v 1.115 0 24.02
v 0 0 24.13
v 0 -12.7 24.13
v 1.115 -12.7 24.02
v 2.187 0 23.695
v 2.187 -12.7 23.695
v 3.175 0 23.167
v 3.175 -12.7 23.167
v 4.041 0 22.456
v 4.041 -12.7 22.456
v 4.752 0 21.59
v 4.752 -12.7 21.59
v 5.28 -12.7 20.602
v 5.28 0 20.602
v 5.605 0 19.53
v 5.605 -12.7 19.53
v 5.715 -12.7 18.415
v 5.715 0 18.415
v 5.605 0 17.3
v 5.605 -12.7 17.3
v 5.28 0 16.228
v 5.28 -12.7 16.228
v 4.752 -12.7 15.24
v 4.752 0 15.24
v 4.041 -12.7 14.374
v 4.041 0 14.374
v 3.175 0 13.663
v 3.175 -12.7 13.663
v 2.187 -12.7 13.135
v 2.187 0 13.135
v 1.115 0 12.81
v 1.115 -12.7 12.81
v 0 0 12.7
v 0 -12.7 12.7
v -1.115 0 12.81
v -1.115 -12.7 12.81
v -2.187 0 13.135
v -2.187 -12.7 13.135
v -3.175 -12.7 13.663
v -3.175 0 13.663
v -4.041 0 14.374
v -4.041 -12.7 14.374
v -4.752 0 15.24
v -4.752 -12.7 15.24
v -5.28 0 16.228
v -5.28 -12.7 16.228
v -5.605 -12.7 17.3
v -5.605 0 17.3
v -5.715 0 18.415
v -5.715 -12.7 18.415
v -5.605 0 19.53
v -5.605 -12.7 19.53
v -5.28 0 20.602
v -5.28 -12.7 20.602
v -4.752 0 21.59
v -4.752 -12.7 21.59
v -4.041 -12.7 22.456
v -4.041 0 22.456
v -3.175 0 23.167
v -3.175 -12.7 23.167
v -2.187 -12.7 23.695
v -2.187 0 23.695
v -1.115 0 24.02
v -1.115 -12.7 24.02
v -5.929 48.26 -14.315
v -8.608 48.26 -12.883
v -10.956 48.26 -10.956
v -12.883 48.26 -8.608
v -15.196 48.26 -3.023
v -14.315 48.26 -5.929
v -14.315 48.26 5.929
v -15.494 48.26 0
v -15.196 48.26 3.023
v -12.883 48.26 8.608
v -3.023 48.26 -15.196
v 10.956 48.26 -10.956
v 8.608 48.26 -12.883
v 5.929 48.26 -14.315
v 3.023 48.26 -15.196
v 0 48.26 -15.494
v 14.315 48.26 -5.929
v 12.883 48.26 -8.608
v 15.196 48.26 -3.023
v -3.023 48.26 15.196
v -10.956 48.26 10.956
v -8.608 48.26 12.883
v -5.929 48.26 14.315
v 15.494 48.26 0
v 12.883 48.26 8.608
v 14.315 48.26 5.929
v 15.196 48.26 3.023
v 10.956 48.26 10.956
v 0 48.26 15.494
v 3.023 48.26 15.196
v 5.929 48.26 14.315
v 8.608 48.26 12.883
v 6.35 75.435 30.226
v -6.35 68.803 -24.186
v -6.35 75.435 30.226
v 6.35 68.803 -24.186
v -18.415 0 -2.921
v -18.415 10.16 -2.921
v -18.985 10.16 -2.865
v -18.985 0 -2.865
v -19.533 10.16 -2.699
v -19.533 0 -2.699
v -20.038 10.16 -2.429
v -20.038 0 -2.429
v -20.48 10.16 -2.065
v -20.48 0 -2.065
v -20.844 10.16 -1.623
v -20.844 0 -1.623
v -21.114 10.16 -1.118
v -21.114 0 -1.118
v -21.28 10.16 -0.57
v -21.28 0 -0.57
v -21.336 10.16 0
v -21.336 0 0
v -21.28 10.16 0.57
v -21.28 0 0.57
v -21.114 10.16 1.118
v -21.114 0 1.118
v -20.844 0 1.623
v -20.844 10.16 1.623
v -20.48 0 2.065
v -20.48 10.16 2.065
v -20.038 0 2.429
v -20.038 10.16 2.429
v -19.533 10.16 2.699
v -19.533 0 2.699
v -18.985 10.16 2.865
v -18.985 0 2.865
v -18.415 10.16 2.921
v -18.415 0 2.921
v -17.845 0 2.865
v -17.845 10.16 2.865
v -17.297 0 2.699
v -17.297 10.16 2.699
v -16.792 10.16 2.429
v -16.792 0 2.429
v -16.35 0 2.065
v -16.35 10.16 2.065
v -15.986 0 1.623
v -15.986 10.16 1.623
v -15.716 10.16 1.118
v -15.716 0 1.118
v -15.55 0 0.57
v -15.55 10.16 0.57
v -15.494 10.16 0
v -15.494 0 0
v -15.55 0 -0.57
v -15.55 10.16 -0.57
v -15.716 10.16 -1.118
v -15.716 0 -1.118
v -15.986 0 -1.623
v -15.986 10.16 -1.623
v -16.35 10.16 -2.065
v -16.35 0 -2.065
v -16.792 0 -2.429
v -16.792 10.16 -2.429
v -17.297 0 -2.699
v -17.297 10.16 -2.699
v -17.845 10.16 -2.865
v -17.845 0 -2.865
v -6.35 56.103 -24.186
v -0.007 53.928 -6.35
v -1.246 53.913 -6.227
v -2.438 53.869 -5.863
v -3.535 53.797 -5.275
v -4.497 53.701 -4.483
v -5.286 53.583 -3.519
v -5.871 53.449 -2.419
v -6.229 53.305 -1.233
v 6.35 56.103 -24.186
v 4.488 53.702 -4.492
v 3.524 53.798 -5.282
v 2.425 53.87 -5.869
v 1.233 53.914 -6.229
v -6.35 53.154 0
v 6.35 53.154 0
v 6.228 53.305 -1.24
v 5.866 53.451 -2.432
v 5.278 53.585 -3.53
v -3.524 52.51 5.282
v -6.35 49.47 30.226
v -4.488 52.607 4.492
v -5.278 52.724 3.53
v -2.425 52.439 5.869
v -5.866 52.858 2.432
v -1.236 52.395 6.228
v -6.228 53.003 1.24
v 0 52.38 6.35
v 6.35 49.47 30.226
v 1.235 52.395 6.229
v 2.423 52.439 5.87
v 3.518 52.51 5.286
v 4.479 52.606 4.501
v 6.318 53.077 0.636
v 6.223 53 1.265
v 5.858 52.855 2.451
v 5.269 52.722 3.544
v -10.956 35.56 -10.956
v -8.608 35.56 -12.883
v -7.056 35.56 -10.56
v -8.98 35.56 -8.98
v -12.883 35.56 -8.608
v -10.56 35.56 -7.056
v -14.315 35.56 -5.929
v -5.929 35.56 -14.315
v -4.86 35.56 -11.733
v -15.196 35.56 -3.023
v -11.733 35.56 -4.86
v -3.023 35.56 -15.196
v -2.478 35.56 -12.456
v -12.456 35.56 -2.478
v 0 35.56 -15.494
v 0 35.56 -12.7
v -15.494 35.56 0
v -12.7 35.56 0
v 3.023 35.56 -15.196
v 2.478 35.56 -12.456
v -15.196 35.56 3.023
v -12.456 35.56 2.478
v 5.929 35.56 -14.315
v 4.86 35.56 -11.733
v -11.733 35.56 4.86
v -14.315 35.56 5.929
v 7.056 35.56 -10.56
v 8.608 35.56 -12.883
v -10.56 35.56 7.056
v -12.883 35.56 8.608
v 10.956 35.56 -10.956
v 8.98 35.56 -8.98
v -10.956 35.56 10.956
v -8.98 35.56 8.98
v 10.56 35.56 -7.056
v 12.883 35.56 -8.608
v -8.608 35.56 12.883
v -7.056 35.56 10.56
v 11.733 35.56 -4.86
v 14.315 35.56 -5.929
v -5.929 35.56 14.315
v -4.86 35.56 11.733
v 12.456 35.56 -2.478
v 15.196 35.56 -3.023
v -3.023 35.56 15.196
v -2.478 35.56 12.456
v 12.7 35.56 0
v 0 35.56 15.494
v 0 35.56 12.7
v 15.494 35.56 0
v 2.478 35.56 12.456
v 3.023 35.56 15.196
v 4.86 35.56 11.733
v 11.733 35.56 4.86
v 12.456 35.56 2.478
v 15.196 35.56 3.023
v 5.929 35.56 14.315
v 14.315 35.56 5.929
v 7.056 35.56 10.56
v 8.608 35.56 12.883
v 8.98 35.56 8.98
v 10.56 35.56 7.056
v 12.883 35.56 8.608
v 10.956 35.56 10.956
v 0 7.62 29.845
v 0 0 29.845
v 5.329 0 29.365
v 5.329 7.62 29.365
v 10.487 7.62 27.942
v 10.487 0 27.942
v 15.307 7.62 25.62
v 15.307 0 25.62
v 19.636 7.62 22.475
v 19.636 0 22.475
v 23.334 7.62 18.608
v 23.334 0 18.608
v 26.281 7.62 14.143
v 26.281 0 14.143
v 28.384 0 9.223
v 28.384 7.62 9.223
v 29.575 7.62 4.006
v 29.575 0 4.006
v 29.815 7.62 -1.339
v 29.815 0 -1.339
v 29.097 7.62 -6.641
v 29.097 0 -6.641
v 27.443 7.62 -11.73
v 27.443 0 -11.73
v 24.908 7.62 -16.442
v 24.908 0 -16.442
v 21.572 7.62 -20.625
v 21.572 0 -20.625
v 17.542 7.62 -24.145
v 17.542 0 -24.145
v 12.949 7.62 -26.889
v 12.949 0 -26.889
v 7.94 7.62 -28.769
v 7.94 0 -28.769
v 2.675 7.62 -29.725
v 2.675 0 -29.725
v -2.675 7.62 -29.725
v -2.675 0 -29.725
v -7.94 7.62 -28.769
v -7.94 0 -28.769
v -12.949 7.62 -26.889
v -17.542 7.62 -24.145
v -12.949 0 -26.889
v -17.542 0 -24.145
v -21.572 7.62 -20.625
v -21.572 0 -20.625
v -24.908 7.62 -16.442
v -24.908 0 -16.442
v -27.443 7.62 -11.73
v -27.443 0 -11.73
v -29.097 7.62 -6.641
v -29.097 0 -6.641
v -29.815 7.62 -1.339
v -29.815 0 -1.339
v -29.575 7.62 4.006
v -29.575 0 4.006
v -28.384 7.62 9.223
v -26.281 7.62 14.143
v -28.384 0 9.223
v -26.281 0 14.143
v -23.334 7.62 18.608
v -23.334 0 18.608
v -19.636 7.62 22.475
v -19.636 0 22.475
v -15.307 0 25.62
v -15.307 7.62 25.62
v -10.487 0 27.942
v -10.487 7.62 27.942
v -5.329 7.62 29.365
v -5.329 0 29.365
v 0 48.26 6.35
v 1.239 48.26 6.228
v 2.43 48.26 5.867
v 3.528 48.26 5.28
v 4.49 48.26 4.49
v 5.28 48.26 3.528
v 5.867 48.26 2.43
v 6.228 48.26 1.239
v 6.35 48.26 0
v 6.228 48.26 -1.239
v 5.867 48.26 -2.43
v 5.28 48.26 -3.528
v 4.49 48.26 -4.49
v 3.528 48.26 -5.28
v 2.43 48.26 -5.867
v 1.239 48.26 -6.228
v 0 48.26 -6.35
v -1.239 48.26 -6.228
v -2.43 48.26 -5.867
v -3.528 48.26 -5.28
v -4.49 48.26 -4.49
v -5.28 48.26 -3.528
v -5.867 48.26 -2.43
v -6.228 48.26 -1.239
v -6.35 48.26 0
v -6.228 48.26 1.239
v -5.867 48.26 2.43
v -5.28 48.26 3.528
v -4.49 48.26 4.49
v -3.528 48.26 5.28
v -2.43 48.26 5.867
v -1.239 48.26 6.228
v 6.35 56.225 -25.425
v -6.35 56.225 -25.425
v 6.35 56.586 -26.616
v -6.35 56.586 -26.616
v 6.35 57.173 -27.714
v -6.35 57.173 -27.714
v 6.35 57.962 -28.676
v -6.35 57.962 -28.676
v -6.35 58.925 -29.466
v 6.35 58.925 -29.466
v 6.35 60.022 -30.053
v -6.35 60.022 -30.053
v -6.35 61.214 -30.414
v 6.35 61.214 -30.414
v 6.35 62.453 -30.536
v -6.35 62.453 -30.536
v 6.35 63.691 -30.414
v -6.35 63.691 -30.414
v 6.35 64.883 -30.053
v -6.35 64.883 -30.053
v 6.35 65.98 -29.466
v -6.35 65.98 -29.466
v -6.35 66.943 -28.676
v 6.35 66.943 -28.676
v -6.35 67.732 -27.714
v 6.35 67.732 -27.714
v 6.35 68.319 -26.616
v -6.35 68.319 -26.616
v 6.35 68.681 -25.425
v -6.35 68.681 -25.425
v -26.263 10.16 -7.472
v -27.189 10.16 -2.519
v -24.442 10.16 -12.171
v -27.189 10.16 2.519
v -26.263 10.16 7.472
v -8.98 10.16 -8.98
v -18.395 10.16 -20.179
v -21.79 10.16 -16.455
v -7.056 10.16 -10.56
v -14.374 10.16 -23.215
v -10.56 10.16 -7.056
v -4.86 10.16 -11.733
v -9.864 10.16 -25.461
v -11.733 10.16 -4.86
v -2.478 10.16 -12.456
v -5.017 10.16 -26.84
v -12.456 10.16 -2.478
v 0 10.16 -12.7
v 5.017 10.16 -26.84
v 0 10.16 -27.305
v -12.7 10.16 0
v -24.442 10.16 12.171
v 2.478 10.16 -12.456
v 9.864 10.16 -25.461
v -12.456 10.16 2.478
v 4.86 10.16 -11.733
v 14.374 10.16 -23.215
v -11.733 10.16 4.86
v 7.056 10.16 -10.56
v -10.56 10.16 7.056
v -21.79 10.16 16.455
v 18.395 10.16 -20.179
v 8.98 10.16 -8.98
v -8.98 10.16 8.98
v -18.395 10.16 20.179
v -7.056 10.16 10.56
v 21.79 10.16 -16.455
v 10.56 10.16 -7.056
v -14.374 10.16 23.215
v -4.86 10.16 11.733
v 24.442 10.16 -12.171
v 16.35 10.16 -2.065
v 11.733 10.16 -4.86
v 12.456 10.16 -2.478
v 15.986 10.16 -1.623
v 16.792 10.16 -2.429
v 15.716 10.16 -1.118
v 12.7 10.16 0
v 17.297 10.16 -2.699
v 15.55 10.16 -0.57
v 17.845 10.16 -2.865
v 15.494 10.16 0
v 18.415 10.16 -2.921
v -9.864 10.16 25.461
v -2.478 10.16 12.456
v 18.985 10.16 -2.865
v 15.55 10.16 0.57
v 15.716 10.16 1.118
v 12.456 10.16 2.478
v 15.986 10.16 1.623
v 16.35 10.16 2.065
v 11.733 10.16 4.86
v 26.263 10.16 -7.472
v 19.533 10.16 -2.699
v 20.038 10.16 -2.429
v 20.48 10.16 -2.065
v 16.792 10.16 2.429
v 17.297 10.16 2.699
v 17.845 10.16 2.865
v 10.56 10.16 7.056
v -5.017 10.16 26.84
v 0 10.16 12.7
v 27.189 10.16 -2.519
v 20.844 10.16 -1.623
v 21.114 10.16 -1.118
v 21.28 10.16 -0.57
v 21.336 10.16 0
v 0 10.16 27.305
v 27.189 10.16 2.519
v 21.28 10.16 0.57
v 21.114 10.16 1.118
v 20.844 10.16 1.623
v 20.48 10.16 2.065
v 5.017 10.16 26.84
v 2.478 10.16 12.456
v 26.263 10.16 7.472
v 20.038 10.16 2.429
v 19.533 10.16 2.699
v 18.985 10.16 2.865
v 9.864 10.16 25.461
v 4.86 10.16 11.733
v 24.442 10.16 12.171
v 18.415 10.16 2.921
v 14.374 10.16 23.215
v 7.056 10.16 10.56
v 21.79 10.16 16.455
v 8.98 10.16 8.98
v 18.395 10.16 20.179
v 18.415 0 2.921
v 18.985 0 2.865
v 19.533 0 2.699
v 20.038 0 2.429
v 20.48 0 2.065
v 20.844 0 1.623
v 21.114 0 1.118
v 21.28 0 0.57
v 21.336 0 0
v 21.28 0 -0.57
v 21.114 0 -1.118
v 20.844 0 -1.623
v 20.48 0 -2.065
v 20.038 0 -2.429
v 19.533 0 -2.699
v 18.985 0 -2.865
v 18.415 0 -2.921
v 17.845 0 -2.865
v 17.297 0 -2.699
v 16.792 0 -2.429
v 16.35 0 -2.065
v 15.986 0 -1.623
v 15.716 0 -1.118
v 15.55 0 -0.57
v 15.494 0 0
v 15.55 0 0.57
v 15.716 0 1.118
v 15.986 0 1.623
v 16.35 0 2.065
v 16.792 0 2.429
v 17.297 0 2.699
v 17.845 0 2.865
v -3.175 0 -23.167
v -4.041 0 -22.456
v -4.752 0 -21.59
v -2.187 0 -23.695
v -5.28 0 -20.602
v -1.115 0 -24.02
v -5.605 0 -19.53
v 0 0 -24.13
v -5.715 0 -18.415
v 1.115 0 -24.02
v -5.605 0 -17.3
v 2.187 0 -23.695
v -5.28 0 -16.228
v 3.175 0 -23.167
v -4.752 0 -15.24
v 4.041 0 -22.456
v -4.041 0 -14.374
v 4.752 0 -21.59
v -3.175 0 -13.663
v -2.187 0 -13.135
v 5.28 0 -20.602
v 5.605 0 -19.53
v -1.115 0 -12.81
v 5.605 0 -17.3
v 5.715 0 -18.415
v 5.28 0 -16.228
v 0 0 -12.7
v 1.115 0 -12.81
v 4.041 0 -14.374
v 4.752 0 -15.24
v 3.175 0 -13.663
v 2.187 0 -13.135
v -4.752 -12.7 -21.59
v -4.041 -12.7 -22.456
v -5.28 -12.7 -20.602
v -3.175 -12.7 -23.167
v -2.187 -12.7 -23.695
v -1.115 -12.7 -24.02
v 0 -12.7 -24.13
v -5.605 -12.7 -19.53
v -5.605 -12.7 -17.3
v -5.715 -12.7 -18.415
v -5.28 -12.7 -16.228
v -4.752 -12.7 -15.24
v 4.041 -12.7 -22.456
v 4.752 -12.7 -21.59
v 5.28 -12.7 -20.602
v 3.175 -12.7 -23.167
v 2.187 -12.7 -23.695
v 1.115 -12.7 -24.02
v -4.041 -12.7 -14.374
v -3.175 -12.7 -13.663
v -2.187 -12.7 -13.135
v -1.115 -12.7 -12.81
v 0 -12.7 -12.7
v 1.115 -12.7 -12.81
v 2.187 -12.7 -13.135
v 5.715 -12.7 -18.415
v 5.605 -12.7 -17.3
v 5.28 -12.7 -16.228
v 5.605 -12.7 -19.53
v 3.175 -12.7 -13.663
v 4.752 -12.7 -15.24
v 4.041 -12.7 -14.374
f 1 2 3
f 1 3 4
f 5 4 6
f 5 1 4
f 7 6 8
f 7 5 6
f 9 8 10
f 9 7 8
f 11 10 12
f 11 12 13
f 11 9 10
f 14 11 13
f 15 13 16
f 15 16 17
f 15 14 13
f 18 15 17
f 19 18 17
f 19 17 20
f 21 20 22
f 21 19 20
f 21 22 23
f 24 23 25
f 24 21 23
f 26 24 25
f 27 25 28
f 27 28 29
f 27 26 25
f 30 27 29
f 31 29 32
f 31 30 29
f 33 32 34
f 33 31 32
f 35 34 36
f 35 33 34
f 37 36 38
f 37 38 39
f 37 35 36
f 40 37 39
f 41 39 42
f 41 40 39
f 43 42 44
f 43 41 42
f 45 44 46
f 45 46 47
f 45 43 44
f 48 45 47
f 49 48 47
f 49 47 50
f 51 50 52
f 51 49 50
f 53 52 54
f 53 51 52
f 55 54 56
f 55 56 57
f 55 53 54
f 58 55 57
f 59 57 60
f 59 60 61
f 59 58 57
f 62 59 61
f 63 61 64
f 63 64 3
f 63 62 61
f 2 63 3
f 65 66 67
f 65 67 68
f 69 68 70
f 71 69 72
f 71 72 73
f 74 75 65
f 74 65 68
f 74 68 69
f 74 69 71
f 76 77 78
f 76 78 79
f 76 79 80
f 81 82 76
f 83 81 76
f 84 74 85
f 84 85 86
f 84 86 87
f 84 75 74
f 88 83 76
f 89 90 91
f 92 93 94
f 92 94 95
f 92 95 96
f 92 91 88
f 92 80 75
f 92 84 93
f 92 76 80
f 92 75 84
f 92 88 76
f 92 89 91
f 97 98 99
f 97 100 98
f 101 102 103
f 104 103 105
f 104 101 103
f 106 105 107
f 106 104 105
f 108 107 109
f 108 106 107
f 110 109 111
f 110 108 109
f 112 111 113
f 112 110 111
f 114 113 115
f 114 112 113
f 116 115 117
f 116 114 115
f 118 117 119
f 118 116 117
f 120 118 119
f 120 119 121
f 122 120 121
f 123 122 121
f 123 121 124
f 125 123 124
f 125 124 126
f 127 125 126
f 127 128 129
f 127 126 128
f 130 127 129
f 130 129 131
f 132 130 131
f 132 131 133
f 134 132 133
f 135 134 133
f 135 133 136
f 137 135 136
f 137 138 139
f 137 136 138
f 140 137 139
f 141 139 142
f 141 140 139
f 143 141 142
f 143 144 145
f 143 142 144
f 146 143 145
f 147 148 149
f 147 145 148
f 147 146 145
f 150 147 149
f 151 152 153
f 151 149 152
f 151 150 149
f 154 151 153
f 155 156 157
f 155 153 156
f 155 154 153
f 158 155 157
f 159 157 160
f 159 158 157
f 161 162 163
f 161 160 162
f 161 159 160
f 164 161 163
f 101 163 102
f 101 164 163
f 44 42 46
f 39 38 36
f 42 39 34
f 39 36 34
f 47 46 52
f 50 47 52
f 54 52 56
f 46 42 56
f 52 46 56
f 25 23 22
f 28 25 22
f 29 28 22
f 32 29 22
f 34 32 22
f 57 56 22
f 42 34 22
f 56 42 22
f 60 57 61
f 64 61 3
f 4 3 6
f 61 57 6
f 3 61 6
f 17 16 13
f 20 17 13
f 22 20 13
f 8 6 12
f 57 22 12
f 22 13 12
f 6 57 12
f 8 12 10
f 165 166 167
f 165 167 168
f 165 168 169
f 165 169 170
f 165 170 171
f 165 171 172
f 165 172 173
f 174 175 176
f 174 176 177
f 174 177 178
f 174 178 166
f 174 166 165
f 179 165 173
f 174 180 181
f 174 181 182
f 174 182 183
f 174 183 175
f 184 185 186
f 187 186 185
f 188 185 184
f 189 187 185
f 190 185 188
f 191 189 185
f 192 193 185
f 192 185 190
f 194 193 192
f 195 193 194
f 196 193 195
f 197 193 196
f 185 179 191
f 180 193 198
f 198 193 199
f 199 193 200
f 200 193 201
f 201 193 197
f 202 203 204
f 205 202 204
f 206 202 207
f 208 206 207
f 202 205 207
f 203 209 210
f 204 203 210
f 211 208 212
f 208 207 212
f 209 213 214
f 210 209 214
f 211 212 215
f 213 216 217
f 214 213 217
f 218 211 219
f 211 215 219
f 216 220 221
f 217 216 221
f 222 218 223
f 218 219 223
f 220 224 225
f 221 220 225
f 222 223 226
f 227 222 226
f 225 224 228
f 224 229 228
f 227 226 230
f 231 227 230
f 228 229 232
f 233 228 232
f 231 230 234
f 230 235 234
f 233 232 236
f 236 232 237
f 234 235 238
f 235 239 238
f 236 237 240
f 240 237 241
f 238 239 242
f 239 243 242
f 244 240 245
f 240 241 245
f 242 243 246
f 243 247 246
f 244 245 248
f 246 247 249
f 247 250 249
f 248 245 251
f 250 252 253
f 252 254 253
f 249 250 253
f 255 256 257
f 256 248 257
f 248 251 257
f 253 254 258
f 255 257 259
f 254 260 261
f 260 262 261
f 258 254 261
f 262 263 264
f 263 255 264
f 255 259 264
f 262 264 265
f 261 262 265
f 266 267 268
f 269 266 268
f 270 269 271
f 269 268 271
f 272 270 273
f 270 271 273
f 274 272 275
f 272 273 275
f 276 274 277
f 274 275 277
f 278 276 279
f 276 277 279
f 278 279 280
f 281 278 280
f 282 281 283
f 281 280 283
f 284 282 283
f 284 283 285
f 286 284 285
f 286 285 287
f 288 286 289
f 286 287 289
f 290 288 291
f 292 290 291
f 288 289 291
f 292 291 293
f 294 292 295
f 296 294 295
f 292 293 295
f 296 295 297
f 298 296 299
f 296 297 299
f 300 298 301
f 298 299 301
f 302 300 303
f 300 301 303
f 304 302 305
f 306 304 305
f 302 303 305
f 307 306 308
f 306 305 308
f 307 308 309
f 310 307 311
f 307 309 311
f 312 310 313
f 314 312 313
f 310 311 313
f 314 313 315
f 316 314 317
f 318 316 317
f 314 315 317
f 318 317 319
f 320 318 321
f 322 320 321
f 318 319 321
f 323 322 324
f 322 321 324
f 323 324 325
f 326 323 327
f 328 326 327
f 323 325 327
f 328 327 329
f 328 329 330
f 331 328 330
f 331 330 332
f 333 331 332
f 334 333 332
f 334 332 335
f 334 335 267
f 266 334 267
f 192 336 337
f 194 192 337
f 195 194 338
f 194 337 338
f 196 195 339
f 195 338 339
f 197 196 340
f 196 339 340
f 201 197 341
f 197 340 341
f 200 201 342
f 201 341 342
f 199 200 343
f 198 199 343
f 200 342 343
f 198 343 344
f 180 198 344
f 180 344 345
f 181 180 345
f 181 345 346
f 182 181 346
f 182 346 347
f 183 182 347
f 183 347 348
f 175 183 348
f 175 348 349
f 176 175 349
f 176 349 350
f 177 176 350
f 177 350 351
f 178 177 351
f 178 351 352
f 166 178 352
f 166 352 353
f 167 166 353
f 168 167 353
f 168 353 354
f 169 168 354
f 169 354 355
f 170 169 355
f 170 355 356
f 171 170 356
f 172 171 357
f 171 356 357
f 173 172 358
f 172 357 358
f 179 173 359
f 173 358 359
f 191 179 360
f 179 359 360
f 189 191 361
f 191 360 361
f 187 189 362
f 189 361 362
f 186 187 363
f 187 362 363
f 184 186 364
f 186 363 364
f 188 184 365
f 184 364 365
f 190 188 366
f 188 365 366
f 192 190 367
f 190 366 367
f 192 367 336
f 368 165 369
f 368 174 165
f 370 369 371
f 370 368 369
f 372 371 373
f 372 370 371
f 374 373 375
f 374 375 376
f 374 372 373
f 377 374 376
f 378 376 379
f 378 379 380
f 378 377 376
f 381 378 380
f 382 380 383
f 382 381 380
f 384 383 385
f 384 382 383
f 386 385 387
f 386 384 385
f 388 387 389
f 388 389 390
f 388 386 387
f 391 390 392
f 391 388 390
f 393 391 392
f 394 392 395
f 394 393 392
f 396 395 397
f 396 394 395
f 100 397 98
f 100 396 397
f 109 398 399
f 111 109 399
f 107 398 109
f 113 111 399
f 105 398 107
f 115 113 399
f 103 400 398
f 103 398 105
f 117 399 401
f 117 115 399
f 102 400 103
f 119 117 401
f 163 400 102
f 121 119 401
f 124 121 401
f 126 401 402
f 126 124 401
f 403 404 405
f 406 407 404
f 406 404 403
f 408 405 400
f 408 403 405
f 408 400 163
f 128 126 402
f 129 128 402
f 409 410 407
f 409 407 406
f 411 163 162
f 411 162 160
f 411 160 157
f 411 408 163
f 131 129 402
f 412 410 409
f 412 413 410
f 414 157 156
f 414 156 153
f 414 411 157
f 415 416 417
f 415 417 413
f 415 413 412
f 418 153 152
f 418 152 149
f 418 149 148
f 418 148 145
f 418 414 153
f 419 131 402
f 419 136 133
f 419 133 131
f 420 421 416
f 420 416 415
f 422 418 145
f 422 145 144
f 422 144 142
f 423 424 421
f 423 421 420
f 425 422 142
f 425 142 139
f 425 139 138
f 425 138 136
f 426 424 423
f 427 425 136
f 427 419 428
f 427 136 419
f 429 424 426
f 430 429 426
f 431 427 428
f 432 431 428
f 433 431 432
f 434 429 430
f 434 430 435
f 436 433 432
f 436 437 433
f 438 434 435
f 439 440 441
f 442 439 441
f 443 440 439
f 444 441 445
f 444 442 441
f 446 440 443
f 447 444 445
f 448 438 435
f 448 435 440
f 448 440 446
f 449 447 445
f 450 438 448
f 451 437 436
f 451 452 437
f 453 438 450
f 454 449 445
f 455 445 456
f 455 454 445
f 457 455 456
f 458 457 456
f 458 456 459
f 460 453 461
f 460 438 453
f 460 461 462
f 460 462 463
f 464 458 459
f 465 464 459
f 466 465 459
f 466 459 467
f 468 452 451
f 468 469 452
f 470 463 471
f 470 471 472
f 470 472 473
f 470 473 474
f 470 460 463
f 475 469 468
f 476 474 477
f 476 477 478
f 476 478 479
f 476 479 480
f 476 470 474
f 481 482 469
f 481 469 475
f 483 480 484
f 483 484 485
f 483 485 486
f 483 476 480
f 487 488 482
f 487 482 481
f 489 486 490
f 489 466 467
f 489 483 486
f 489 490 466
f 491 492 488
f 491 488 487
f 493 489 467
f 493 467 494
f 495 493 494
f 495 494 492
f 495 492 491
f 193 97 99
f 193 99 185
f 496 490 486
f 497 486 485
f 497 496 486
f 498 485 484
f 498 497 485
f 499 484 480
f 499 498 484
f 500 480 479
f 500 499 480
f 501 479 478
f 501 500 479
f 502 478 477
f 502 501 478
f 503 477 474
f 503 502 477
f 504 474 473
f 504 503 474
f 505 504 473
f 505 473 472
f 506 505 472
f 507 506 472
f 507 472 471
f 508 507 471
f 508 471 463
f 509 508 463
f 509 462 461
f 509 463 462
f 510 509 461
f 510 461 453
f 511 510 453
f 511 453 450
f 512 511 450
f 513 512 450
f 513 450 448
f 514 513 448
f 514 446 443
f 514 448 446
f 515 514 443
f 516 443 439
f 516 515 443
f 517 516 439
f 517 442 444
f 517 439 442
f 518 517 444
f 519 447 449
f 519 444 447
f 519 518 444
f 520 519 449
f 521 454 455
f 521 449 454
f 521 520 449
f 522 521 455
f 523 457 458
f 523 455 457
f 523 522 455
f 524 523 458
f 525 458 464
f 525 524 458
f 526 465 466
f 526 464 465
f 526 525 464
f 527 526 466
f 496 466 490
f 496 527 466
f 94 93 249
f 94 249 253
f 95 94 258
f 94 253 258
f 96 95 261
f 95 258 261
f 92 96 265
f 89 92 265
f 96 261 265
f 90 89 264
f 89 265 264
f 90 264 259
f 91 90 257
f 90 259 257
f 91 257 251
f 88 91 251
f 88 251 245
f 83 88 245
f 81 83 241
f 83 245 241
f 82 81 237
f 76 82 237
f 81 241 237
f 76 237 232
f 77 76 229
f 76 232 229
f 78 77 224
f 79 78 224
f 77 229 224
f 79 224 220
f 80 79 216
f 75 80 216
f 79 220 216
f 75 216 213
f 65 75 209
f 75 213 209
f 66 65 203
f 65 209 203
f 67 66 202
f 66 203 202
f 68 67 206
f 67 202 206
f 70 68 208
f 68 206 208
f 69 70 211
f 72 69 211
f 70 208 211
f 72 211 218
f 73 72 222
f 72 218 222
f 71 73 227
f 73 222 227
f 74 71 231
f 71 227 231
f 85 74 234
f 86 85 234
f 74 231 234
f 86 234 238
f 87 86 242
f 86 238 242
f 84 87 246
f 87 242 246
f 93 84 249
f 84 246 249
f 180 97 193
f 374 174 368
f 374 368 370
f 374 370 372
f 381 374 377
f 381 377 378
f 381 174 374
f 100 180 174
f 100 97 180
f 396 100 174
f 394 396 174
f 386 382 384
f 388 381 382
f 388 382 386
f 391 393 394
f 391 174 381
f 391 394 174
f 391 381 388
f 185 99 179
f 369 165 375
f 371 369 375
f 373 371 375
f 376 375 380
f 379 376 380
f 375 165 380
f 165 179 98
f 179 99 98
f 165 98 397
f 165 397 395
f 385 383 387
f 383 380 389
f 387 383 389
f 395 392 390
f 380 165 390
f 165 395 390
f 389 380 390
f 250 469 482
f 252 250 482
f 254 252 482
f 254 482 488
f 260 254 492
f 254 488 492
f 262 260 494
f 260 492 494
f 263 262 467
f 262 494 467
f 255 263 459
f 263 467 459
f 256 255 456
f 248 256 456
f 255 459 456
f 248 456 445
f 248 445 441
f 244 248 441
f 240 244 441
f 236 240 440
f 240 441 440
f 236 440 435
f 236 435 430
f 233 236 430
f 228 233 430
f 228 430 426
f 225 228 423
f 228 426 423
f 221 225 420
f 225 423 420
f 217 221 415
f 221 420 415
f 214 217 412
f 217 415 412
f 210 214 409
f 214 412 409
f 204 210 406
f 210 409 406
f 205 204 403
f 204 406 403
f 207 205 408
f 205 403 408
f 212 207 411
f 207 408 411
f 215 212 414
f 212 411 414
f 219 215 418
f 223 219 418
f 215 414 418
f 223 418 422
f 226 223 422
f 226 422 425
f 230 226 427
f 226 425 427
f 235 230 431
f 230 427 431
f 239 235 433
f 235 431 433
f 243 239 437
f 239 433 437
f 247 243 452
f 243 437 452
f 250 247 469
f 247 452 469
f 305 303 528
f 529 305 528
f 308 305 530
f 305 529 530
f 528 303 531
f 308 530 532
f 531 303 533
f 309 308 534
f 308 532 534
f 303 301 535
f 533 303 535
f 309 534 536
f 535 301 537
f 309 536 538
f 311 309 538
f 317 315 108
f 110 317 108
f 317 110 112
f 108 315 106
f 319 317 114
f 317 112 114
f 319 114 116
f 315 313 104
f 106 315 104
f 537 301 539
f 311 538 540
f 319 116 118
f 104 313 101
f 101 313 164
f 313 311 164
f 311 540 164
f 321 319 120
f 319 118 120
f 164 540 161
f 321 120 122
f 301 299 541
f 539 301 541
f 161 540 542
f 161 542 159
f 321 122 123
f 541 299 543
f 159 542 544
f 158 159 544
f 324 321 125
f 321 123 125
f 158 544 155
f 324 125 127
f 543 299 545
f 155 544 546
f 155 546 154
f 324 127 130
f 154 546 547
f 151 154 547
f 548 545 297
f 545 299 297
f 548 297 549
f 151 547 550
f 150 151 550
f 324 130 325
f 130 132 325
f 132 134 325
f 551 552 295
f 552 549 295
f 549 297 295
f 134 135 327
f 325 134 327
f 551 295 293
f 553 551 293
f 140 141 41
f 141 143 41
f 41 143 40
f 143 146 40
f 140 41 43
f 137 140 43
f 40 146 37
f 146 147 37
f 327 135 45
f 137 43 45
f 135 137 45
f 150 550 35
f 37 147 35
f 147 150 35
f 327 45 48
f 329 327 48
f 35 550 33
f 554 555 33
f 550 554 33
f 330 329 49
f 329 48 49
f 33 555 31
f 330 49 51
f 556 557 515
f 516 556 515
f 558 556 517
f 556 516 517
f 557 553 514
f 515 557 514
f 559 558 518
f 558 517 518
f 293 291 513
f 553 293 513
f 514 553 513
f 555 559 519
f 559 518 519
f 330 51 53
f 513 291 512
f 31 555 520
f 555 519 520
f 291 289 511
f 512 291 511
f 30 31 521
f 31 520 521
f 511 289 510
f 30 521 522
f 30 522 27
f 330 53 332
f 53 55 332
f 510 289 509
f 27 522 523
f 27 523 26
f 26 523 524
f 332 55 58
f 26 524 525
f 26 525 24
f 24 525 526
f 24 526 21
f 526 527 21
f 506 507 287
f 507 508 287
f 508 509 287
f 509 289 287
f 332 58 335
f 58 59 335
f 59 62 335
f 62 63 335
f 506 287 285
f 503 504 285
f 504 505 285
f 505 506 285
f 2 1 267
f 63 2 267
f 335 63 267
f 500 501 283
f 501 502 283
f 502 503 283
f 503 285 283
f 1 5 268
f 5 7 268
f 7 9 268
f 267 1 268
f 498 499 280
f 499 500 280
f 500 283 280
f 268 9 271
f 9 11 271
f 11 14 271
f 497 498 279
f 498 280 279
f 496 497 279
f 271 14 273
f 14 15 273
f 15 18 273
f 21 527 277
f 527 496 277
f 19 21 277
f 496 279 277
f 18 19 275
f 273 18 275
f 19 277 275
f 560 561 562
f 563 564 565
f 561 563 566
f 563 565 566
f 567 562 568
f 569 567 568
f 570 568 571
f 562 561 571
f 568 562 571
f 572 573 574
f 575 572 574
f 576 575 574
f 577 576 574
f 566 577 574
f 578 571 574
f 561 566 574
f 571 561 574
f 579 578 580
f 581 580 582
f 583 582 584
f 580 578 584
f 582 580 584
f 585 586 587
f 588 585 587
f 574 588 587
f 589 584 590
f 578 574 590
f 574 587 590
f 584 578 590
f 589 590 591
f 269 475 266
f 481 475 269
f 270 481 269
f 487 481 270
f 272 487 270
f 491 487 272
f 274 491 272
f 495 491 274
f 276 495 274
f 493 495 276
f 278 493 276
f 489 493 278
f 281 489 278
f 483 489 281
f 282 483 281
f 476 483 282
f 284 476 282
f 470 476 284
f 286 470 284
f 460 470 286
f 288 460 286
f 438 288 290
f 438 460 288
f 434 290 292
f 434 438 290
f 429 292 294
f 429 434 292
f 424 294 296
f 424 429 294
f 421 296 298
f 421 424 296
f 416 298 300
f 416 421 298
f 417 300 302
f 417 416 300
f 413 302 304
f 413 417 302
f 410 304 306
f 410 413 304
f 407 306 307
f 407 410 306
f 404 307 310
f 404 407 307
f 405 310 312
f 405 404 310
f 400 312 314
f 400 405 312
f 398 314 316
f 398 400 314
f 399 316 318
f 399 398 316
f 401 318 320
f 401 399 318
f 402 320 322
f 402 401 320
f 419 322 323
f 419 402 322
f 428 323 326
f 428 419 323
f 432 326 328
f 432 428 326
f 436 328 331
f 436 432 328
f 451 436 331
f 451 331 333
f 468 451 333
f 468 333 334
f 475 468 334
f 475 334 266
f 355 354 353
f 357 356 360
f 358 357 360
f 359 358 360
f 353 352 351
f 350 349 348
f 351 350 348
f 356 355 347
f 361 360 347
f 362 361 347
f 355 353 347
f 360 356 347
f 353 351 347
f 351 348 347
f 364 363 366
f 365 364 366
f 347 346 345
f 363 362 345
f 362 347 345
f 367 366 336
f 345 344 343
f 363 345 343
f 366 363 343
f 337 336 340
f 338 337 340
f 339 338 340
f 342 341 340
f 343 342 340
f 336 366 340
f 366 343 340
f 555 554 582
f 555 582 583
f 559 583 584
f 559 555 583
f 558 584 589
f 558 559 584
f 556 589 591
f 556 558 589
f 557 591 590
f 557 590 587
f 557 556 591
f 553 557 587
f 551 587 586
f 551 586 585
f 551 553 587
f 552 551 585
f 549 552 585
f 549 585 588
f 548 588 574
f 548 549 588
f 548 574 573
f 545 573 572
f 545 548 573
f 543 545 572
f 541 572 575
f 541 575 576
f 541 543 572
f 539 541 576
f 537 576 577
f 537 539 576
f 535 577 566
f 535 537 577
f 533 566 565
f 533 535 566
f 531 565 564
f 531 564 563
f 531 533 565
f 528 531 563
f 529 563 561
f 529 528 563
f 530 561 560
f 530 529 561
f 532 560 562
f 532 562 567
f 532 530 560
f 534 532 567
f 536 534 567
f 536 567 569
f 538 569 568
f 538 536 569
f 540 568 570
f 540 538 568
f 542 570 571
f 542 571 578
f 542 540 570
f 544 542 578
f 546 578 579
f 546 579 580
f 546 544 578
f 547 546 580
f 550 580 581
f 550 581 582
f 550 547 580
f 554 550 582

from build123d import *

# Parameters (mm, degrees)
SKETCH2_R           = 29.845
BOSS_EXTRUDE1_DEPTH = 10.16
SKETCH1_R           = 5.715
BOSS_EXTRUDE2_DEPTH = 12.7
SKETCH1_3_R         = 2.921
CUT_EXTRUDE1_DEPTH  = 12.7
SKETCH3_R           = 12.7
BOSS_EXTRUDE3_DEPTH = 25.4
CHAMFER1_SIZE       = 2.54
SKETCH4_R           = 15.494
BOSS_EXTRUDE4_DEPTH = 12.7
BOSS_EXTRUDE5_DEPTH = 6.35
BOSS_EXTRUDE6_REACH = 76.427
SKETCH5_R           = 6.35


with BuildPart() as part:
    # Sketch2 → Boss-Extrude1 (new body)
    with BuildSketch(Plane(origin=(0, 0, 0), x_dir=(1, 0, 0), z_dir=(0, 1, 0))):
        Circle(SKETCH2_R)
    extrude(amount=BOSS_EXTRUDE1_DEPTH)

    # Sketch1 → Boss-Extrude2 (add)
    with BuildSketch(Plane(origin=(0, 0, 0), x_dir=(1, 0, 0), z_dir=(0, 1, 0))):
        with Locations((0, 18.415)):
            Circle(SKETCH1_R)
        with Locations((0, -18.415)):
            Circle(SKETCH1_R)
    extrude(amount=-BOSS_EXTRUDE2_DEPTH)

    # Sketch1<3> → Cut-Extrude1 (cut)
    with BuildSketch(Plane(origin=(0, 0, 0), x_dir=(1, 0, 0), z_dir=(0, 1, 0))):
        with Locations((18.415, 0)):
            Circle(SKETCH1_3_R)
        with Locations((-18.415, 0)):
            Circle(SKETCH1_3_R)
    extrude(amount=CUT_EXTRUDE1_DEPTH, mode=Mode.SUBTRACT)

    # Sketch3 → Boss-Extrude3 (add)
    with BuildSketch(Plane(origin=(0, 10.16, 0), x_dir=(1, 0, 0), z_dir=(0, 1, 0))):
        Circle(SKETCH3_R)
    extrude(amount=BOSS_EXTRUDE3_DEPTH)

    # Chamfer1
    chamfer1_edges = [part.edges().sort_by_distance(p)[0] for p in [
        (-29.845, 10.16, 0),
    ]]
    chamfer(chamfer1_edges, length=CHAMFER1_SIZE)

    # Sketch4 → Boss-Extrude4 (add)
    with BuildSketch(Plane(origin=(0, 35.56, 0), x_dir=(1, 0, 0), z_dir=(0, 1, 0))):
        Circle(SKETCH4_R)
    extrude(amount=BOSS_EXTRUDE4_DEPTH)


with BuildPart() as body_2:
    # Sketch6 → Boss-Extrude5 (new, symmetric)
    with BuildSketch(Plane(origin=(0, 0, 0), x_dir=(0, 0, -1), z_dir=(1, 0, 0))):
        with BuildLine():
            Line((24.18628847, 68.802534381), (-30.225802667, 75.435358558))
            Line((-30.225802667, 75.435358558), (-30.225802667, 49.469710204))
            Line((-30.225802667, 49.469710204), (24.18628847, 56.102534381))
            ThreePointArc((24.18628847, 56.102534381), (30.53628847, 62.452534381), (24.18628847, 68.802534381))
        make_face()
    extrude(amount=BOSS_EXTRUDE5_DEPTH, both=True)


with BuildPart() as body_3:
    # Boss-Extrude6: up to this plane
    boss_extrude6_end = Plane(origin=(6.35, 49.469710204, 30.225802667), z_dir=(0, 0.9926520071358438, 0.1210041021171628))
    # Sketch5 → Boss-Extrude6 (new, up to the surface)
    with BuildSketch(Plane(origin=(0, 48.26, 0), x_dir=(1, 0, 0), z_dir=(0, 1, 0)), mode=Mode.PRIVATE) as boss_extrude6_sk1:
        Circle(SKETCH5_R)
    boss_extrude6_tool1 = split(extrude(boss_extrude6_sk1.sketch, amount=BOSS_EXTRUDE6_REACH, mode=Mode.PRIVATE), bisect_by=boss_extrude6_end, keep=Keep.BOTH, mode=Mode.PRIVATE)
    add(boss_extrude6_tool1.solids().sort_by_distance((0, 48.26, 0))[0])


with BuildPart() as body_2_1:
    add(body_2.part)

    # Combine1: union body 3
    add(body_3.part)


solid = Compound([part.part, body_2_1.part])
